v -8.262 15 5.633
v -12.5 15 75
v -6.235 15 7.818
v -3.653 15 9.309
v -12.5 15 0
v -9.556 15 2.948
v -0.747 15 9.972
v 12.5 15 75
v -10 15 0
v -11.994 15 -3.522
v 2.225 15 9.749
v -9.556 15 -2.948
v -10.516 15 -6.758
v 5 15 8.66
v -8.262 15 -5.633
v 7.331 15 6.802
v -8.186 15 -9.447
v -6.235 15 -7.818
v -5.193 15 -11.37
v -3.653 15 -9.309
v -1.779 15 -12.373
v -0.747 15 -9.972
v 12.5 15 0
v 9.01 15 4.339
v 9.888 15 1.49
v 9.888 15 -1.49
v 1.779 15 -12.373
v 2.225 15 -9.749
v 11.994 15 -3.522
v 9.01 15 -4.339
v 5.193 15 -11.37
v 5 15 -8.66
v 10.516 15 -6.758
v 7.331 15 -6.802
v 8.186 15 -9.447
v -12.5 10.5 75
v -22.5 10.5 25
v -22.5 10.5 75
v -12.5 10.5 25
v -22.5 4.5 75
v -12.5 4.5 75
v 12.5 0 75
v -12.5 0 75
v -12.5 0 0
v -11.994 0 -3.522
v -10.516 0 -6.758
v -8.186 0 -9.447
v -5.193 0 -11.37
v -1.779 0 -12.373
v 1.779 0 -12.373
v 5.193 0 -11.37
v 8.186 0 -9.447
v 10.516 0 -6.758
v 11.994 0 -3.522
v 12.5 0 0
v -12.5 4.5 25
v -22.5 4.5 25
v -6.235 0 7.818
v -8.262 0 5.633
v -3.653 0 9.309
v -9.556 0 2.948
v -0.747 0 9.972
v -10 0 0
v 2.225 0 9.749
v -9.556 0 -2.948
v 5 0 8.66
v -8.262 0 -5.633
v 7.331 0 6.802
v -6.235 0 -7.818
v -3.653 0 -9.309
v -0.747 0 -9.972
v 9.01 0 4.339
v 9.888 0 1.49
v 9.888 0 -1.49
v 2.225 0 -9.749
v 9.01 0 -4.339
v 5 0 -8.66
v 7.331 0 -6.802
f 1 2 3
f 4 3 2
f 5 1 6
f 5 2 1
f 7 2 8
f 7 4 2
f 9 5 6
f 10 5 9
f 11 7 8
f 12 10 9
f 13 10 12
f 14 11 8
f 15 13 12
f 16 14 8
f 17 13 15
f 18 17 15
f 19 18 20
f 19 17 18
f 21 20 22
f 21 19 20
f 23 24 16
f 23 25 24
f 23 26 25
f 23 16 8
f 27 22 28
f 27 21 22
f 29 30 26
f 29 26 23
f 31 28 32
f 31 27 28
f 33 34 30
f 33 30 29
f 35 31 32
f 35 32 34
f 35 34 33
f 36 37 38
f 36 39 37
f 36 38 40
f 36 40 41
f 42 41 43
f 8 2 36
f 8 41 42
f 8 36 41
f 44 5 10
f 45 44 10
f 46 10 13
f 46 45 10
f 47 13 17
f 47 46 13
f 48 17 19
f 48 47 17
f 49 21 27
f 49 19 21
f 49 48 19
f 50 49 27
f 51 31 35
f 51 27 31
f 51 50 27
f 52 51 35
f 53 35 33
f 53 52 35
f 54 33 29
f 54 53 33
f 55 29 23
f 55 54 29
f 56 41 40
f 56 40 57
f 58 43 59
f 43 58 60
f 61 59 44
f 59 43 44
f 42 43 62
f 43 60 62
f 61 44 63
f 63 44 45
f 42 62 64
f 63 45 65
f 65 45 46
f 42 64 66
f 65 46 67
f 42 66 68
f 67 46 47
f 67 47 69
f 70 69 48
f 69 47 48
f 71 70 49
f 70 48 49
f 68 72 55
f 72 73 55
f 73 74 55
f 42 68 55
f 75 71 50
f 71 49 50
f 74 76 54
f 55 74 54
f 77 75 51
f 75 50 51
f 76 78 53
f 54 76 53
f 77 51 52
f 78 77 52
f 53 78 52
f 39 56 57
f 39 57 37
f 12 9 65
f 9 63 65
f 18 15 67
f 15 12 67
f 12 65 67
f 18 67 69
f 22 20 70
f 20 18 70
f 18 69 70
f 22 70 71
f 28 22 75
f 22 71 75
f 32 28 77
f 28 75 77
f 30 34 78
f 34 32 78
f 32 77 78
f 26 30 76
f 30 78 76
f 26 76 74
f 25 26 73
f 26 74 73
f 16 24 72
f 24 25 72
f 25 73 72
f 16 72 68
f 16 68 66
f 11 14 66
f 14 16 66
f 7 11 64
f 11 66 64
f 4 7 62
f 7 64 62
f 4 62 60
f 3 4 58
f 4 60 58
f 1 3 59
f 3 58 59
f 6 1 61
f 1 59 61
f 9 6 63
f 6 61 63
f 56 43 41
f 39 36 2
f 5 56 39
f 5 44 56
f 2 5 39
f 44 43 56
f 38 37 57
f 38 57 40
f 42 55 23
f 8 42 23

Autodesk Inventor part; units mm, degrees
ref_plane "YZ Plane" through (0, 0, 0) normal (1, 0, 0) x (0, 1, 0)
ref_plane "XZ Plane" through (0, 0, 0) normal (0, 1, 0) x (-1, 0, 0)
ref_plane "XY Plane" through (0, 0, 0) normal (0, 0, 1) x (1, 0, 0)
sketch "Sketch1" plane through (0, 0, 0) normal (0, 1, 0) x (-1, 0, 0)
  circle A0 centre (0, 0) radius 10
  circle A1 centre (0, 0) radius 12.5
  line L0 (12.5, 0) -> (12.5, 50)
  line L1 (-12.5, 0) -> (-12.5, 50)
  line L2 (-12.5, 50) -> (12.5, 50)
  dimension "d0" = 20
  dimension "d1" = 25
  dimension "d2" = 50
extrude "Extrusion1" add sketch "Sketch1" along normal blind 15
sketch "Sketch2" plane through (-12.5, 0, 0) normal (-1, 0, 0) x (0, 0, 1)
  line L0 (-12.5, 0) -> (-12.5, 15) projected
  line L1 (-12.5, 7.5) -> (37.5, 7.5)
  line L2 (25, 7.5) -> (25, 4.5)
  line L3 (25, 4.5) -> (25, 10.5)
  line L4 (25, 10.5) -> (75, 10.5)
  line L5 (75, 10.5) -> (75, 4.5)
  line L6 (75, 4.5) -> (25, 4.5)
  point P0 (0, 0)
  dimension "d5" = 50
  dimension "d8" = 3
  dimension "d9" = 6
  dimension "d10" = 50
extrude "Extrusion2" add sketch "Sketch2" along normal blind 10
sketch "Sketch3" plane through (-12.5, 0, 50) normal (0, 0, 1) x (1, 0, 0)
  point P0 (12.5, 0)
sketch "Sketch4" plane through (-12.5, 0, 50) normal (0, 0, 1) x (1, 0, 0)
  line L0 (25, 0) -> (25, 15) projected
  line L1 (25, 0) -> (25, 15)
  line L2 (0, 15) -> (25, 15) projected
  line L3 (25, 15) -> (0, 15)
  line L4 (0, 0) -> (0, 15) projected
  line L5 (0, 15) -> (0, 0)
  line L6 (0, 0) -> (25, 0) projected
  line L7 (0, 0) -> (25, 0)
  point P0 (12.5, 0)
extrude "Extrusion3" add sketch "Sketch4" along normal blind 25
sketch "Sketch5" plane through (-12.5, 4.5, 25) normal (0, -1, 0) x (1, 0, 0)
  point P0 (12.5, -25)
sketch "Sketch6" plane through (-12.5, 4.5, 25) normal (0, -1, 0) x (1, 0, 0)
  line L0 (0, 0) -> (-10, 0) projected
  line L1 (-5, 0) -> (-5, 50)
  line L2 (0, 50) -> (-10, 50) projected
  line L3 (-5, 0) -> (-5, 10)
  line L4 (-3.75, 8.75) -> (-6.25, 8.75)
  line L5 (-6.25, 8.75) -> (-6.25, 11.25)
  line L6 (-6.25, 11.25) -> (-3.75, 11.25)
  line L7 (-3.75, 11.25) -> (-3.75, 8.75)
  line L8 (-3.75, 8.75) -> (-6.25, 11.25) construction
  line L9 (-6.25, 8.75) -> (-3.75, 11.25) construction
  line L10 (-5, 11.25) -> (-5, 15.25)
  line L11 (-3.75, 15.25) -> (-6.25, 15.25)
  line L12 (-6.25, 15.25) -> (-6.25, 17.75)
  line L13 (-6.25, 17.75) -> (-3.75, 17.75)
  line L14 (-3.75, 17.75) -> (-3.75, 15.25)
  point P0 (12.5, -25)
  dimension "d15" = 10
  dimension "d16" = 2.5
  dimension "d17" = 2.5
  dimension "d18" = 4
  dimension "d19" = 2.5
sketch "Sketch7" plane through (-12.5, 4.5, 25) normal (0, -1, 0) x (1, 0, 0)
  line L0 (-4.9925, 17.7874) -> (-4.9925, 21.7874)
  line L1 (-4.9925, 21.7874) -> (-3.7425, 21.7874)
  line L2 (-3.7425, 21.7874) -> (-3.7425, 24.2874)
  line L3 (-3.7425, 24.2874) -> (-6.2425, 24.2874)
  line L4 (-6.2425, 24.2874) -> (-6.2425, 21.7874)
  line L5 (-6.2425, 21.7874) -> (-4.9925, 21.7874)
  line L6 (-4.9925, 24.2874) -> (-4.9925, 28.2874)
  line L7 (-4.9925, 28.2874) -> (-6.2425, 28.2874)
  line L8 (-6.2425, 28.2874) -> (-6.2425, 30.7874)
  line L9 (-6.2425, 30.7874) -> (-3.7425, 30.7874)
  line L10 (-3.7425, 30.7874) -> (-3.7425, 28.2874)
  line L11 (-4.9925, 28.2874) -> (-3.7425, 28.2874)
  line L12 (-4.9925, 30.7874) -> (-4.9925, 34.7874)
  line L13 (-4.9925, 34.7874) -> (-3.7425, 34.7874)
  line L14 (-3.7425, 34.7874) -> (-3.7425, 37.2874)
  line L15 (-3.7425, 37.2874) -> (-6.2425, 37.2874)
  line L16 (-6.2425, 37.2874) -> (-6.2425, 34.7874)
  line L17 (-6.2425, 34.7874) -> (-4.9925, 34.7874)
  line L18 (-4.9925, 37.2874) -> (-4.9925, 41.2874)
  line L19 (-4.9925, 41.2874) -> (-3.7425, 41.2874)
  line L20 (-3.7425, 41.2874) -> (-3.7425, 43.7874)
  line L21 (-3.7425, 43.7874) -> (-6.2425, 43.7874)
  line L22 (-6.2425, 43.7874) -> (-6.2425, 41.2874)
  line L23 (-6.2425, 41.2874) -> (-4.9925, 41.2874)
  line L24 (-5, 15.2622) -> (-5, 8.7622)
  line L25 (-5, 8.7622) -> (-5, 4.7622)
  line L26 (-5, 4.7622) -> (-6.25, 4.7622)
  line L27 (-6.25, 4.7622) -> (-6.25, 2.2622)
  line L28 (-6.25, 2.2622) -> (-3.75, 2.2622)
  line L29 (-3.75, 2.2622) -> (-3.75, 4.7622)
  line L30 (-3.75, 4.7622) -> (-5, 4.7622)
  point P0 (12.5, -25)
  dimension "d20" = 4
  dimension "d21" = 1.25
  dimension "d22" = 2.5
  dimension "d23" = 2.5
  dimension "d24" = 4
  dimension "d25" = 1.25
  dimension "d26" = 2.5
  dimension "d27" = 4
  dimension "d28" = 2.5
  dimension "d29" = 4
  dimension "d30" = 2.5
  dimension "d31" = 6.5
  dimension "d32" = 4
  dimension "d33" = 1.25
  dimension "d34" = 2.5
  dimension "d35" = 2.5
